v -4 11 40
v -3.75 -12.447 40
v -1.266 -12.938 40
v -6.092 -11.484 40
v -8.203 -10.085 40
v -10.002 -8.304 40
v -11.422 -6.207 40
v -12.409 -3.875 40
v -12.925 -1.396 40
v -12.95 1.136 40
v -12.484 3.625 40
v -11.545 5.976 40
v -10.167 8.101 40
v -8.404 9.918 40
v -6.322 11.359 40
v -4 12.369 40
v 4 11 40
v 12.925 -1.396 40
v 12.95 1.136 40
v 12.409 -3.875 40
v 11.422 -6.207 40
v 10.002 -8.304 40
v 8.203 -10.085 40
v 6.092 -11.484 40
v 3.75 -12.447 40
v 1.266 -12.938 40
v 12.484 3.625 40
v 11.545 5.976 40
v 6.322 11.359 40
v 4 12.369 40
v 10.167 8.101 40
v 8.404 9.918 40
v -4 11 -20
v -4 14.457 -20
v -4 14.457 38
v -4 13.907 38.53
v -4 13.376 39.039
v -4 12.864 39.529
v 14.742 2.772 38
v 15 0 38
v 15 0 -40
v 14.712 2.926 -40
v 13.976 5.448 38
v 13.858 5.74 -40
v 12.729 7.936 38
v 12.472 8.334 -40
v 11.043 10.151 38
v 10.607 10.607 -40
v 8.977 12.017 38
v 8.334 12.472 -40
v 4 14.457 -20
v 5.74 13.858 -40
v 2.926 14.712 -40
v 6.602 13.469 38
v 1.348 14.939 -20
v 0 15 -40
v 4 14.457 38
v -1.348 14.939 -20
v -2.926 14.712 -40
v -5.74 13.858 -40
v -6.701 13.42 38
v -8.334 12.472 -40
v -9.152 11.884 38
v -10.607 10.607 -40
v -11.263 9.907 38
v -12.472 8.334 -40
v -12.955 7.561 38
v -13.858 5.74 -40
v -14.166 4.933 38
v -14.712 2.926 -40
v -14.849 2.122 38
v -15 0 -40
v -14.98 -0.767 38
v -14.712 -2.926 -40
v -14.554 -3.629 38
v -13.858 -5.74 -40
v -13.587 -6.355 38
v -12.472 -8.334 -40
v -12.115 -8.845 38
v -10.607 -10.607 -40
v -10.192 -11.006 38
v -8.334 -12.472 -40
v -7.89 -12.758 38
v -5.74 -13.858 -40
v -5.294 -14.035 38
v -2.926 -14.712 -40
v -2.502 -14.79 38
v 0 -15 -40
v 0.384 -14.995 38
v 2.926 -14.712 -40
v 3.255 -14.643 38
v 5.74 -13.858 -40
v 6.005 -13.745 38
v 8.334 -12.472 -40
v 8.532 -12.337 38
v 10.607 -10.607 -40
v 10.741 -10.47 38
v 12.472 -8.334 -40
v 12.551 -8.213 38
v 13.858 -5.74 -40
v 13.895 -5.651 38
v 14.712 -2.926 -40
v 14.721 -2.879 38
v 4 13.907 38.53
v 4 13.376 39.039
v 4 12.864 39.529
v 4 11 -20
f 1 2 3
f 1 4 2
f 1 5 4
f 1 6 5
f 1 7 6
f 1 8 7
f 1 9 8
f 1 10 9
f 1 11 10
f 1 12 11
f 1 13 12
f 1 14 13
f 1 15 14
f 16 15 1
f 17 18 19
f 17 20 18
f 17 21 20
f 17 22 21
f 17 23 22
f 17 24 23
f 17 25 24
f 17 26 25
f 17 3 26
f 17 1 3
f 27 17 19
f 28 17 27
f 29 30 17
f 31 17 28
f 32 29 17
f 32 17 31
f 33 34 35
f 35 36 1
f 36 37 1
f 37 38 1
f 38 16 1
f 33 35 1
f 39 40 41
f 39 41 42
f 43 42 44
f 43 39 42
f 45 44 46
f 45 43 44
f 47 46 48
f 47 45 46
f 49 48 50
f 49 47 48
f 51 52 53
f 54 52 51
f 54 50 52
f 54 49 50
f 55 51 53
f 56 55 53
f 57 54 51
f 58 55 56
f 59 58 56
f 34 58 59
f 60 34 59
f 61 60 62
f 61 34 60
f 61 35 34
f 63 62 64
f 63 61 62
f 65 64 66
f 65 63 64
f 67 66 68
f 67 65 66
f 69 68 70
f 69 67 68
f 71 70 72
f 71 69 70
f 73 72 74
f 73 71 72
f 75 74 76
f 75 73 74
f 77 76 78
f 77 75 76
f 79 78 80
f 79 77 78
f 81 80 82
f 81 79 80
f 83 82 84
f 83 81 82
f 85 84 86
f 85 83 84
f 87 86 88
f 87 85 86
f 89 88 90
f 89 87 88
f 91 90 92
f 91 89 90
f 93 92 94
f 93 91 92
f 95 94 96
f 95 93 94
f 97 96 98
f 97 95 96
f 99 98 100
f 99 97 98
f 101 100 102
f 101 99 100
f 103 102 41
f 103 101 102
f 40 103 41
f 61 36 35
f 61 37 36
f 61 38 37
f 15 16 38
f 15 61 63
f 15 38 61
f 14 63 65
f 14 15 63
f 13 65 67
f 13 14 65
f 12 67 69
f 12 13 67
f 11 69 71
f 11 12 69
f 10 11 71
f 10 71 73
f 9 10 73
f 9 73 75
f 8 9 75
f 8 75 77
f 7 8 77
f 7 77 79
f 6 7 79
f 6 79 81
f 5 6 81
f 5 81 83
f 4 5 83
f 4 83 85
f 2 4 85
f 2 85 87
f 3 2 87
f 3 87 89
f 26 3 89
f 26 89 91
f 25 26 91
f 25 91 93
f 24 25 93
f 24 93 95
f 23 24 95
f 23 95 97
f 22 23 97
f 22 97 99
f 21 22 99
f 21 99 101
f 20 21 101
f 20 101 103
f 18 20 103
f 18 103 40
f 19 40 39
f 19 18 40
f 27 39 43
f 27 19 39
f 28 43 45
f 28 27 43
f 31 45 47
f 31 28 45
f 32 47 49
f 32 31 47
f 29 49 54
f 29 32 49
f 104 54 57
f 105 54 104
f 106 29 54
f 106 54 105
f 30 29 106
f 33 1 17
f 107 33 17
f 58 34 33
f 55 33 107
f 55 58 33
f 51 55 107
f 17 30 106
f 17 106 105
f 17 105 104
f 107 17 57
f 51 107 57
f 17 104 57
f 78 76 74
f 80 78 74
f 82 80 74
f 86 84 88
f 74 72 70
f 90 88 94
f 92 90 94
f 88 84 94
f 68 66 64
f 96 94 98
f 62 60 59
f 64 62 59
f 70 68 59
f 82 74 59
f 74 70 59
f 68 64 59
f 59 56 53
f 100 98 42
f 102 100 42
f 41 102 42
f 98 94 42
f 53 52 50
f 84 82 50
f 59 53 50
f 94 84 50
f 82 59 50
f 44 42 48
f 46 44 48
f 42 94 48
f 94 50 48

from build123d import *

# Parameters (mm, degrees)
SKETCH1_R           = 15
BOSS_EXTRUDE1_DEPTH = 40
CUT_EXTRUDE1_DEPTH  = 60
CHAMFER1_SIZE       = 2


with BuildPart() as part:
    # Sketch1 → Boss-Extrude1 (new, symmetric)
    with BuildSketch(Plane.XY):
        Circle(SKETCH1_R)
    extrude(amount=BOSS_EXTRUDE1_DEPTH, both=True)

    # Sketch2 → Cut-Extrude1 (cut)
    with BuildSketch(Plane.XY.offset(40)):
        with BuildLine():
            Line((-4, 14.456832295), (-4, 11))
            Line((-4, 11), (4, 11))
            Line((4, 11), (4, 14.456832295))
            ThreePointArc((4, 14.456832295), (0, 15), (-4, 14.456832295))
        make_face()
    extrude(amount=-CUT_EXTRUDE1_DEPTH, mode=Mode.SUBTRACT)

    # Chamfer1
    chamfer1_edges = [part.edges().sort_by_distance(p)[0] for p in [
        (-9.082951062, -11.937336386, 40),
    ]]
    chamfer(chamfer1_edges, length=CHAMFER1_SIZE)


solid = part.part
